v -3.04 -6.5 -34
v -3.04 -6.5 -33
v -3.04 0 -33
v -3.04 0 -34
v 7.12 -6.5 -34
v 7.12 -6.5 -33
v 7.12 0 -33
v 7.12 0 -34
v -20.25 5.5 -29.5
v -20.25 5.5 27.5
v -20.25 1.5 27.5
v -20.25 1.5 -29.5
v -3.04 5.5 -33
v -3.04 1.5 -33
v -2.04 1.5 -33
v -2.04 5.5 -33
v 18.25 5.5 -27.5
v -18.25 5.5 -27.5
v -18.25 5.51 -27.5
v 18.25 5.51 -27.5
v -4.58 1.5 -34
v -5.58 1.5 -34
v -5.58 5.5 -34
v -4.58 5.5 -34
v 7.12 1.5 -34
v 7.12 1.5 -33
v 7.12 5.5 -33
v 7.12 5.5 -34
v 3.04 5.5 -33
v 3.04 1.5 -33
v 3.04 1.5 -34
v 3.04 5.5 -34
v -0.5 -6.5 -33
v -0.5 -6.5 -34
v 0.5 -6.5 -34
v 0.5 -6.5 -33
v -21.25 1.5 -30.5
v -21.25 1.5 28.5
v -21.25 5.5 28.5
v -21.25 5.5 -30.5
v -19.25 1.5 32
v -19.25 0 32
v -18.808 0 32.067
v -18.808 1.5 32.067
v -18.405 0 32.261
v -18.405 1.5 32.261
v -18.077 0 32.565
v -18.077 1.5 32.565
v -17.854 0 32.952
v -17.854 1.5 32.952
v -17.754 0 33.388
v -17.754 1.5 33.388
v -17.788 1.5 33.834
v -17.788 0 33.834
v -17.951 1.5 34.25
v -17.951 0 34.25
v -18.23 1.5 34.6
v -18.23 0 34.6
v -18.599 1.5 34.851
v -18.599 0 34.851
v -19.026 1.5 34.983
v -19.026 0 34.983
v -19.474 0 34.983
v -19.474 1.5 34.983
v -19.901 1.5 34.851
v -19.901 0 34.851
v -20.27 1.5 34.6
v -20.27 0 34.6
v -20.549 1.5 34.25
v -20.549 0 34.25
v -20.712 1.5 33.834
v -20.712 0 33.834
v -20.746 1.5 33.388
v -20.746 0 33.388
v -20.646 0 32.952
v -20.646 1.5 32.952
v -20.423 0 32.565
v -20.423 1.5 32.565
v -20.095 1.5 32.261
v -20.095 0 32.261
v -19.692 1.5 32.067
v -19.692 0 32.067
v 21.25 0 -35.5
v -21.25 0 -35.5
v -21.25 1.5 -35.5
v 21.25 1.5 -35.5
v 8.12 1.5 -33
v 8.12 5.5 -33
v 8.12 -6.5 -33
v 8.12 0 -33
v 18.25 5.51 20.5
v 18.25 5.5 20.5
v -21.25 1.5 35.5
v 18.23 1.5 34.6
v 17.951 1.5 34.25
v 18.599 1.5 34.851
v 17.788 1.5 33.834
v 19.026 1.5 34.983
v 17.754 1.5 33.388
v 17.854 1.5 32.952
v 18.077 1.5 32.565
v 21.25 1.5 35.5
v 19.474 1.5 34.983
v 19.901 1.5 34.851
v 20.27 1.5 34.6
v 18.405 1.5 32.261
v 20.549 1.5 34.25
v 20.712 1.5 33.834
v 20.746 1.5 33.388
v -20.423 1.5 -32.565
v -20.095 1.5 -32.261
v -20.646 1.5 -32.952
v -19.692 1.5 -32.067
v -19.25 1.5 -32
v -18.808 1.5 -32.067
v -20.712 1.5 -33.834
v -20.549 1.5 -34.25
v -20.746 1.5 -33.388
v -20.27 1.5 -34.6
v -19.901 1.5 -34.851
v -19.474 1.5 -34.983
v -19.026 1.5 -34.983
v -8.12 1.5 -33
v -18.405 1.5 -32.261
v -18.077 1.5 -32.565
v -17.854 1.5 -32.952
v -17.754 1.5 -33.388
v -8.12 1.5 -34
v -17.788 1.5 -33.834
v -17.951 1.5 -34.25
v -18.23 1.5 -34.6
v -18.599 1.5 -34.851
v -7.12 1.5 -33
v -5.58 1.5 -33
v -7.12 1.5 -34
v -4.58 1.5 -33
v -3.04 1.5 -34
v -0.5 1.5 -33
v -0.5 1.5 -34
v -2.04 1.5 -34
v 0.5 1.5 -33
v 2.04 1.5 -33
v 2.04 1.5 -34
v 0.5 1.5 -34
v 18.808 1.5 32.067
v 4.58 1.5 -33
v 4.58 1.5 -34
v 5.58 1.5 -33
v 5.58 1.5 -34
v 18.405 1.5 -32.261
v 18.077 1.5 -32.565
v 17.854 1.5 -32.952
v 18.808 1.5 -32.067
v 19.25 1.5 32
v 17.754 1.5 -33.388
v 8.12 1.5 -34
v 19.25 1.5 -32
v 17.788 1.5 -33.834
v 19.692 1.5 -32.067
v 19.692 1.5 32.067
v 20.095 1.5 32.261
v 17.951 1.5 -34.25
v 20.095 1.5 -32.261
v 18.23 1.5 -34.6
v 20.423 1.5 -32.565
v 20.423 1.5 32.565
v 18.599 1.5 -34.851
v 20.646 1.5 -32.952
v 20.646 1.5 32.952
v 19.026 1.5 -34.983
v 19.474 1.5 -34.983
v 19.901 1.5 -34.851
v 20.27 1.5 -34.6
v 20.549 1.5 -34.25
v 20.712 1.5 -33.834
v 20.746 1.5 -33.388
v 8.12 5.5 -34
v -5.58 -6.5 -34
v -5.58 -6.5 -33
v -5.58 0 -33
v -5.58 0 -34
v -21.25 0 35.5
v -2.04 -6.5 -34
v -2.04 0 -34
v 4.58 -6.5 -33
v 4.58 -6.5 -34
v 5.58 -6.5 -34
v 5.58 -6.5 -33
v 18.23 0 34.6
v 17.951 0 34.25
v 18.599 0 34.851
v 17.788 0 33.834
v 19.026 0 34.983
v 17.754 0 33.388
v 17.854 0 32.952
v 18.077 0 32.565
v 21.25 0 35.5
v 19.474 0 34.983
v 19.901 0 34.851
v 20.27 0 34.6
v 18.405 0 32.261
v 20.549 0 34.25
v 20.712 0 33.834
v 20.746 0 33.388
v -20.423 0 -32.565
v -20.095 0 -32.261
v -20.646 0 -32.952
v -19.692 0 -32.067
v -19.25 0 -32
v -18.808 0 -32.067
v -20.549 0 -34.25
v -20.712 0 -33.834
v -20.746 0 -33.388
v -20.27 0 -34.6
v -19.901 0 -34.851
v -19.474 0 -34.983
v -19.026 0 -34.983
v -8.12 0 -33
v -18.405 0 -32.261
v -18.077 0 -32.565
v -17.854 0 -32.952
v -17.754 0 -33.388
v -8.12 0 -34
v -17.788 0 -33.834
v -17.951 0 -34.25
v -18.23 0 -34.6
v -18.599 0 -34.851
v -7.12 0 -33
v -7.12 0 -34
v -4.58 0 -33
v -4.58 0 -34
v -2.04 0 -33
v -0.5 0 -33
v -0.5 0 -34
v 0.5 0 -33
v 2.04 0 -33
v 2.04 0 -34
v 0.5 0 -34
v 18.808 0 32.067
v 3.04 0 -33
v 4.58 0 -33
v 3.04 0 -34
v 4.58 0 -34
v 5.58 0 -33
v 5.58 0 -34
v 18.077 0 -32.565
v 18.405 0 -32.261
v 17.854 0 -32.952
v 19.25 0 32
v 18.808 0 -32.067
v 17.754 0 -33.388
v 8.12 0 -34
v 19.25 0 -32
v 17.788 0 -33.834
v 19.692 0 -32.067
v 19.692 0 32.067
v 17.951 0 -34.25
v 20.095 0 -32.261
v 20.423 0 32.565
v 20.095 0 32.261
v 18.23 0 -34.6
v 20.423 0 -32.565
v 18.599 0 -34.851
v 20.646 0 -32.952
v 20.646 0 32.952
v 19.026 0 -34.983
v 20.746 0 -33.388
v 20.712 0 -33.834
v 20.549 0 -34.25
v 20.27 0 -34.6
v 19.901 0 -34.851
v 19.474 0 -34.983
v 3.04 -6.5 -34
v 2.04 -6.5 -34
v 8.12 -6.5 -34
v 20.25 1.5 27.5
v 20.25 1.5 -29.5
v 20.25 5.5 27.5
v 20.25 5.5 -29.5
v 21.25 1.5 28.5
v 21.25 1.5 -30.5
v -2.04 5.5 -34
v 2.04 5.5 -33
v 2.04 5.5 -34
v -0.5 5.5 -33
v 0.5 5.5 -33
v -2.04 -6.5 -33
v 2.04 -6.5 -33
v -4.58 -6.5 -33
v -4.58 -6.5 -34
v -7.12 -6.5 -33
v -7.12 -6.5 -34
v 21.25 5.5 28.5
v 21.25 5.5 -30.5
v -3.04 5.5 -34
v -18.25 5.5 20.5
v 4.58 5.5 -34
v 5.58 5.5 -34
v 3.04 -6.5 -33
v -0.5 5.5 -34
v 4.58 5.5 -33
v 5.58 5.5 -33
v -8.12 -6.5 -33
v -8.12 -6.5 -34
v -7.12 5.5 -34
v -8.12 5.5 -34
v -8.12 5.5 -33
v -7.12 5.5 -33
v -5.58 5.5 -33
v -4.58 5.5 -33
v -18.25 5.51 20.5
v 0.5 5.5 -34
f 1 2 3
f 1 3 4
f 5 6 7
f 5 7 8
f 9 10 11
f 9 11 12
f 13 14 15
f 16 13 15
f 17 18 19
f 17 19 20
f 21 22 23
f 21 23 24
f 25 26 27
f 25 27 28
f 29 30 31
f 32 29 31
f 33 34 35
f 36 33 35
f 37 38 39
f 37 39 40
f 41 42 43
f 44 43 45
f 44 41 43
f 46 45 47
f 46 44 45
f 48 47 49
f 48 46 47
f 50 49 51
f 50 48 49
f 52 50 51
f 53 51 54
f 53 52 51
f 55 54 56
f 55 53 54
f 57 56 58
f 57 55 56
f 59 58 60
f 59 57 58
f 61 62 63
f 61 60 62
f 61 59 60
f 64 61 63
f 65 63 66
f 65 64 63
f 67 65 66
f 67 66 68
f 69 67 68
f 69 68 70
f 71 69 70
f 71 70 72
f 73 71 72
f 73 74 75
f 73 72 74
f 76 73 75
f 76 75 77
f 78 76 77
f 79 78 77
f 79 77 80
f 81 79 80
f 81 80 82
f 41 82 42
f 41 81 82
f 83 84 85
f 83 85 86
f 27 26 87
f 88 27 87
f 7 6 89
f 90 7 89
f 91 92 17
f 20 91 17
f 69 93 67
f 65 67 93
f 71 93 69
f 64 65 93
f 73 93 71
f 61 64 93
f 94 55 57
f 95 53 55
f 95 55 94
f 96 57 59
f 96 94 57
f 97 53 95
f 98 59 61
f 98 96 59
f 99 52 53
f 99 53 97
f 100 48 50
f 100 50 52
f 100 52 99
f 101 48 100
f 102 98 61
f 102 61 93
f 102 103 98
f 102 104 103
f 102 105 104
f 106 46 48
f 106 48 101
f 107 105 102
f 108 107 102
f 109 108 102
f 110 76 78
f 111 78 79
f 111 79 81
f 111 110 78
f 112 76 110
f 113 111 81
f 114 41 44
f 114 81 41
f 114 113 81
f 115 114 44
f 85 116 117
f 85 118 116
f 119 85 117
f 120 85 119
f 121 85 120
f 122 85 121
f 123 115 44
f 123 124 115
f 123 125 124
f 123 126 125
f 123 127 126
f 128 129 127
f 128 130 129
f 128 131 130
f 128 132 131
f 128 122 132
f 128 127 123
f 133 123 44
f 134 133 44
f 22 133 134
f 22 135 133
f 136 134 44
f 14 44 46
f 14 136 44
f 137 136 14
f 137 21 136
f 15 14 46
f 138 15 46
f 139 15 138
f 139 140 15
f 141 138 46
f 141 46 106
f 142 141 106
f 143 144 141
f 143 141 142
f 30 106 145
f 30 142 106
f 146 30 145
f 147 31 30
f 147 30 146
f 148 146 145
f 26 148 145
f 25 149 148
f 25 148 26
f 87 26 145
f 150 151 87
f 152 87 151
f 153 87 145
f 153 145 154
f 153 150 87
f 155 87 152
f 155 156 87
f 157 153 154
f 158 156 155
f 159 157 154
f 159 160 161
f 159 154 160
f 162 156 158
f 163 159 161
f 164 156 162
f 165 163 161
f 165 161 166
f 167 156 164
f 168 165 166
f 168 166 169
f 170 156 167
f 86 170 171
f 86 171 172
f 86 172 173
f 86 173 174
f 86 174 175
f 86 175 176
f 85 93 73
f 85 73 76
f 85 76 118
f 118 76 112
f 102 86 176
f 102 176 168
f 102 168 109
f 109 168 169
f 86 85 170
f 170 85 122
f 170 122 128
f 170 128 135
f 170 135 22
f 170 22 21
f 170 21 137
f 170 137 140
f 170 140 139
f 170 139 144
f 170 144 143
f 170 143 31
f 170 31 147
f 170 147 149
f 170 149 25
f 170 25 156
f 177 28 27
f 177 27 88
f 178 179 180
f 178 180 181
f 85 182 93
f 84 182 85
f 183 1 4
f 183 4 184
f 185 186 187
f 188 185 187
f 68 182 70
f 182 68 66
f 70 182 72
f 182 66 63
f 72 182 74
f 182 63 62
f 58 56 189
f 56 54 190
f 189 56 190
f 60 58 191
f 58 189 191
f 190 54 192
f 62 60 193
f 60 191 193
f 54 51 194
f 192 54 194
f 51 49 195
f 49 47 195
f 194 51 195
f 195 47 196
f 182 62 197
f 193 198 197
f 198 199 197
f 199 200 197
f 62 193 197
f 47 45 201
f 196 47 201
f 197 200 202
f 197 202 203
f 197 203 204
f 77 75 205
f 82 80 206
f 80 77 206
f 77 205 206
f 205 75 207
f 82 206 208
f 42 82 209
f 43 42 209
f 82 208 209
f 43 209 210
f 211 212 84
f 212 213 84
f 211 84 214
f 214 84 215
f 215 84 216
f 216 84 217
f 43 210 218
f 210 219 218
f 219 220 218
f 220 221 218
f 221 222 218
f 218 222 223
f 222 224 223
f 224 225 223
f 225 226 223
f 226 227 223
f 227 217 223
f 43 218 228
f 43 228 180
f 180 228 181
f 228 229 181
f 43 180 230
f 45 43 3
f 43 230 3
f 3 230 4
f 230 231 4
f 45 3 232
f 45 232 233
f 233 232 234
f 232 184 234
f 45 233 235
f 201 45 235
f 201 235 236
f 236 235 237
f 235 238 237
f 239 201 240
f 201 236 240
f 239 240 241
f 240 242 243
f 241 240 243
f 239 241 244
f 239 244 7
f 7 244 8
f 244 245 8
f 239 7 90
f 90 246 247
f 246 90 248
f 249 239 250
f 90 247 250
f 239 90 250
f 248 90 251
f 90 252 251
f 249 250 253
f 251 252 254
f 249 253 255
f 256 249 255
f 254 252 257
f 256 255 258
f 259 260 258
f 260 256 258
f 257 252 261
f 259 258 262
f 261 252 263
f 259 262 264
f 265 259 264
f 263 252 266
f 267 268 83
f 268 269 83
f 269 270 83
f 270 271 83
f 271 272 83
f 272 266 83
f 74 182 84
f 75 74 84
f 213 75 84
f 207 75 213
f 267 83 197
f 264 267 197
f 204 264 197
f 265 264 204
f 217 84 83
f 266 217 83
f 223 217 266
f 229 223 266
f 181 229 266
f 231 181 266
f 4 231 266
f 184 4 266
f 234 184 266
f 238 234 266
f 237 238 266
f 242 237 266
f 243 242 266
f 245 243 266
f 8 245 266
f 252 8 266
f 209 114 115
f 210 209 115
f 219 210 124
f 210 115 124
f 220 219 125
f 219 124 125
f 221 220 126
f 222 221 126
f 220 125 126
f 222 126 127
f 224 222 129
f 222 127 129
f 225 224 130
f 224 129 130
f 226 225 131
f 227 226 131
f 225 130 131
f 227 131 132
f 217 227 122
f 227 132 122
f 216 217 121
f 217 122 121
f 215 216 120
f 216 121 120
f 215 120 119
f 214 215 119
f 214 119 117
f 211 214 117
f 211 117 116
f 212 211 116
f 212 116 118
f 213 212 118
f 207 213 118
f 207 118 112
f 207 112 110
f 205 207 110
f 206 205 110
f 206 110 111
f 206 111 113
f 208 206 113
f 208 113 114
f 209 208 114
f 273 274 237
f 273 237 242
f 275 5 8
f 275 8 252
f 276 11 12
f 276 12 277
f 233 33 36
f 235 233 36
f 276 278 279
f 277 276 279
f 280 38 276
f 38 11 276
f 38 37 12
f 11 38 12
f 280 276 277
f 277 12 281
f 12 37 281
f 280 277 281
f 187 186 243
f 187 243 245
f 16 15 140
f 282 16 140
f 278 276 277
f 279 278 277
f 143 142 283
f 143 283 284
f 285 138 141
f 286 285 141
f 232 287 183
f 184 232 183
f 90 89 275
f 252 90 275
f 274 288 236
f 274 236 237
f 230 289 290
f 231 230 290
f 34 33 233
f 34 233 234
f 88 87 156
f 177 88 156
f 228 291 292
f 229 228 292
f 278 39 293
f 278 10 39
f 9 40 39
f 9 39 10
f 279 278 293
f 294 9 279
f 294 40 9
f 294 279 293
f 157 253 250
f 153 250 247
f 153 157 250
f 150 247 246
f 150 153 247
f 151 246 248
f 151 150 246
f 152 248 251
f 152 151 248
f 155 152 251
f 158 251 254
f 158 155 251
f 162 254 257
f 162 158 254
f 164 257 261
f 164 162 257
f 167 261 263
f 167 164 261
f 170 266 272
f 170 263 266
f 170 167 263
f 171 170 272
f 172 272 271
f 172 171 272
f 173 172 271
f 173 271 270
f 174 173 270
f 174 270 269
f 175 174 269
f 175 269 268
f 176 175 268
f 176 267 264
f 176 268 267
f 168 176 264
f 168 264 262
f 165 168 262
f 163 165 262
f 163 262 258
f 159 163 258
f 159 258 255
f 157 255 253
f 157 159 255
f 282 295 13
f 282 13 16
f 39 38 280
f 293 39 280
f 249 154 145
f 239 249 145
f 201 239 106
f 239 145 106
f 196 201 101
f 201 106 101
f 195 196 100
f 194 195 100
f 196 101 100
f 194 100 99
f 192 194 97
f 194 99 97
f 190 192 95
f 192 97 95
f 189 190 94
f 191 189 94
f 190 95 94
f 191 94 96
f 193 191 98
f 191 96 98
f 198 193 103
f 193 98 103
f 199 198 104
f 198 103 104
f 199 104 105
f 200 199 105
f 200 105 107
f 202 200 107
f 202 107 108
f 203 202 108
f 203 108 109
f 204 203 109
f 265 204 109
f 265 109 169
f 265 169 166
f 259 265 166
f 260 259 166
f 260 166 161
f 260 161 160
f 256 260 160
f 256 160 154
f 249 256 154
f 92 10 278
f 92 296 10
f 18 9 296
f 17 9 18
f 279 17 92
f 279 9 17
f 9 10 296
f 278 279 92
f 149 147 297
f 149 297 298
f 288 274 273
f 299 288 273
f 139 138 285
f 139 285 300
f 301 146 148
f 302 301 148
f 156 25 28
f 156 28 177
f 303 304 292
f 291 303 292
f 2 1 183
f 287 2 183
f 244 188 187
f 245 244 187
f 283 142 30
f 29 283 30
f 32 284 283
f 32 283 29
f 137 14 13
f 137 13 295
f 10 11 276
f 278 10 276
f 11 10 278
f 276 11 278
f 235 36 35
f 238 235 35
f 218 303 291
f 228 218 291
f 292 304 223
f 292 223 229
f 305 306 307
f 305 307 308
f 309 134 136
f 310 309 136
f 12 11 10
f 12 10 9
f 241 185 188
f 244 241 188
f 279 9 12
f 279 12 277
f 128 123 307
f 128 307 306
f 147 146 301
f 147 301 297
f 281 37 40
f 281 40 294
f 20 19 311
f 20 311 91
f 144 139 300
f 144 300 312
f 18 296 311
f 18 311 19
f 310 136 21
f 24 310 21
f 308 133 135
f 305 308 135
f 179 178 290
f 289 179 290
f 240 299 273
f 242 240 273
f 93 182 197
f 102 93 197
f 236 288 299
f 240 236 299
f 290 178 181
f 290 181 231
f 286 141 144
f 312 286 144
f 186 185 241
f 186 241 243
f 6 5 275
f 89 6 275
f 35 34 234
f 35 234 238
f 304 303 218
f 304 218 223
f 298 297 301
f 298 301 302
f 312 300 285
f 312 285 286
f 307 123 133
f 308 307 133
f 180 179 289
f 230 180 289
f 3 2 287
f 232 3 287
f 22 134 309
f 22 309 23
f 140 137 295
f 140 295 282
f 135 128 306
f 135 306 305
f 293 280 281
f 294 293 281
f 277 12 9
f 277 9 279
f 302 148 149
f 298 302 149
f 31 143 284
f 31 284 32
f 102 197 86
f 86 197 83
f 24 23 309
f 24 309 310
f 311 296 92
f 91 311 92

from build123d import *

# Parameters (mm, degrees)
SKETCH1_W                                  = 42.5
SKETCH1_H                                  = 71
BOSS_EXTRUDE1_DEPTH                        = 1.5
SKETCH7_R                                  = 1.5
CUT_EXTRUDE2_DEPTH                         = 42.401237904
MIRROR1_AT_THE_SECOND_PLANE_COPY_1_SKETC_R = 1.5
MIRROR1_AT_THE_SECOND_PLANE_COPY_1_DEPTH   = 42.401237904
BOSS_EXTRUDE5_START                        = -8
SKETCH8_W                                  = 1
SKETCH8_H                                  = 1
BOSS_EXTRUDE5_DEPTH                        = 12
LPATTERN1_COUNT                            = 4
LPATTERN1_PITCH                            = 2.54
LPATTERN1_COL_COUNT                        = 4
LPATTERN1_COL_PITCH                        = 2.54
SKETCH2_W                                  = 42.5
SKETCH2_H                                  = 59
BOSS_EXTRUDE2_DEPTH                        = 4
SKETCH3_W                                  = 40.5
SKETCH3_H                                  = 57
CUT_EXTRUDE1_DEPTH                         = 44.079142285
SKETCH5_W                                  = 40.5
SKETCH5_H                                  = 57
BOSS_EXTRUDE3_DEPTH                        = 4
SKETCH6_W                                  = 36.5
SKETCH6_H                                  = 48
BOSS_EXTRUDE4_DEPTH                        = 0.01


with BuildPart() as part:
    # Sketch1 → Boss-Extrude1 (new body)
    with BuildSketch(Plane(origin=(0, 0, 0), x_dir=(1, 0, 0), z_dir=(0, 1, 0))):
        Rectangle(SKETCH1_W, SKETCH1_H)
    extrude(amount=BOSS_EXTRUDE1_DEPTH)

    # Sketch7 → Cut-Extrude2 (cut, through all)
    with BuildSketch(Plane(origin=(0, 1.5, 0), x_dir=(1, 0, 0), z_dir=(0, 1, 0))):
        with Locations(Location((-19.25, 33.5, 0), (0, 0, 270))):
            Circle(SKETCH7_R)
    cut_extrude2 = extrude(amount=-CUT_EXTRUDE2_DEPTH, mode=Mode.SUBTRACT)

    # Mirror1: Cut-Extrude2 across plane
    add(cut_extrude2.mirror(Plane.XY), mode=Mode.SUBTRACT)

    # Mirror1 at the second plane: Cut-Extrude2 across plane
    add(cut_extrude2.mirror(Plane(origin=(0, 0, 0), x_dir=(0, 0, 1), z_dir=(1, 0, 0))), mode=Mode.SUBTRACT)

    # Mirror1 at the second plane copy 1 sketc → Mirror1 at the second plane copy 1 (cut, through all)
    with BuildSketch(Plane(origin=(0, 1.5, 0), x_dir=(-1, 0, 0), z_dir=(0, 1, 0))):
        with Locations(Location((-19.25, 33.5, 0), (0, 0, 270))):
            Circle(MIRROR1_AT_THE_SECOND_PLANE_COPY_1_SKETC_R)
    extrude(amount=-MIRROR1_AT_THE_SECOND_PLANE_COPY_1_DEPTH, mode=Mode.SUBTRACT)

    # Sketch8 → Boss-Extrude5 (add)
    with BuildSketch(Plane(origin=(0, 1.5, 0), x_dir=(1, 0, 0), z_dir=(0, 1, 0)).offset(BOSS_EXTRUDE5_START)):
        with Locations((0, 33.5)):
            Rectangle(SKETCH8_W, SKETCH8_H)
    boss_extrude5 = extrude(amount=BOSS_EXTRUDE5_DEPTH)

    # LPattern1: Boss-Extrude5 ×4
    with Locations(*[(i * LPATTERN1_PITCH, 0, 0) for i in range(1, LPATTERN1_COUNT)]):
        add(boss_extrude5)

    # LPattern1 col: Boss-Extrude5 ×4
    with Locations(*[(-i * LPATTERN1_COL_PITCH, 0, 0) for i in range(1, LPATTERN1_COL_COUNT)]):
        add(boss_extrude5)


with BuildPart() as body_2:
    # Sketch2 → Boss-Extrude2 (new body)
    with BuildSketch(Plane(origin=(0, 1.5, 0), x_dir=(1, 0, 0), z_dir=(0, 1, 0))):
        with Locations((0, 1)):
            Rectangle(SKETCH2_W, SKETCH2_H)
    extrude(amount=BOSS_EXTRUDE2_DEPTH)

    # Sketch3 → Cut-Extrude1 (cut, through all)
    with BuildSketch(Plane(origin=(0, 5.5, 0), x_dir=(1, 0, 0), z_dir=(0, 1, 0))):
        with Locations((0, 1)):
            Rectangle(SKETCH3_W, SKETCH3_H)
    extrude(amount=-CUT_EXTRUDE1_DEPTH, mode=Mode.SUBTRACT)


with BuildPart() as body_3:
    # Sketch5 → Boss-Extrude3 (new body)
    with BuildSketch(Plane(origin=(0, 1.5, 0), x_dir=(1, 0, 0), z_dir=(0, 1, 0))):
        with Locations((0, 1)):
            Rectangle(SKETCH5_W, SKETCH5_H)
    extrude(amount=BOSS_EXTRUDE3_DEPTH)

    # Sketch6 → Boss-Extrude4 (add)
    with BuildSketch(Plane(origin=(0, 5.5, 0), x_dir=(1, 0, 0), z_dir=(0, 1, 0))):
        with Locations((0, 3.5)):
            Rectangle(SKETCH6_W, SKETCH6_H)
    extrude(amount=BOSS_EXTRUDE4_DEPTH)


solid = Compound([part.part, body_2.part, body_3.part])
